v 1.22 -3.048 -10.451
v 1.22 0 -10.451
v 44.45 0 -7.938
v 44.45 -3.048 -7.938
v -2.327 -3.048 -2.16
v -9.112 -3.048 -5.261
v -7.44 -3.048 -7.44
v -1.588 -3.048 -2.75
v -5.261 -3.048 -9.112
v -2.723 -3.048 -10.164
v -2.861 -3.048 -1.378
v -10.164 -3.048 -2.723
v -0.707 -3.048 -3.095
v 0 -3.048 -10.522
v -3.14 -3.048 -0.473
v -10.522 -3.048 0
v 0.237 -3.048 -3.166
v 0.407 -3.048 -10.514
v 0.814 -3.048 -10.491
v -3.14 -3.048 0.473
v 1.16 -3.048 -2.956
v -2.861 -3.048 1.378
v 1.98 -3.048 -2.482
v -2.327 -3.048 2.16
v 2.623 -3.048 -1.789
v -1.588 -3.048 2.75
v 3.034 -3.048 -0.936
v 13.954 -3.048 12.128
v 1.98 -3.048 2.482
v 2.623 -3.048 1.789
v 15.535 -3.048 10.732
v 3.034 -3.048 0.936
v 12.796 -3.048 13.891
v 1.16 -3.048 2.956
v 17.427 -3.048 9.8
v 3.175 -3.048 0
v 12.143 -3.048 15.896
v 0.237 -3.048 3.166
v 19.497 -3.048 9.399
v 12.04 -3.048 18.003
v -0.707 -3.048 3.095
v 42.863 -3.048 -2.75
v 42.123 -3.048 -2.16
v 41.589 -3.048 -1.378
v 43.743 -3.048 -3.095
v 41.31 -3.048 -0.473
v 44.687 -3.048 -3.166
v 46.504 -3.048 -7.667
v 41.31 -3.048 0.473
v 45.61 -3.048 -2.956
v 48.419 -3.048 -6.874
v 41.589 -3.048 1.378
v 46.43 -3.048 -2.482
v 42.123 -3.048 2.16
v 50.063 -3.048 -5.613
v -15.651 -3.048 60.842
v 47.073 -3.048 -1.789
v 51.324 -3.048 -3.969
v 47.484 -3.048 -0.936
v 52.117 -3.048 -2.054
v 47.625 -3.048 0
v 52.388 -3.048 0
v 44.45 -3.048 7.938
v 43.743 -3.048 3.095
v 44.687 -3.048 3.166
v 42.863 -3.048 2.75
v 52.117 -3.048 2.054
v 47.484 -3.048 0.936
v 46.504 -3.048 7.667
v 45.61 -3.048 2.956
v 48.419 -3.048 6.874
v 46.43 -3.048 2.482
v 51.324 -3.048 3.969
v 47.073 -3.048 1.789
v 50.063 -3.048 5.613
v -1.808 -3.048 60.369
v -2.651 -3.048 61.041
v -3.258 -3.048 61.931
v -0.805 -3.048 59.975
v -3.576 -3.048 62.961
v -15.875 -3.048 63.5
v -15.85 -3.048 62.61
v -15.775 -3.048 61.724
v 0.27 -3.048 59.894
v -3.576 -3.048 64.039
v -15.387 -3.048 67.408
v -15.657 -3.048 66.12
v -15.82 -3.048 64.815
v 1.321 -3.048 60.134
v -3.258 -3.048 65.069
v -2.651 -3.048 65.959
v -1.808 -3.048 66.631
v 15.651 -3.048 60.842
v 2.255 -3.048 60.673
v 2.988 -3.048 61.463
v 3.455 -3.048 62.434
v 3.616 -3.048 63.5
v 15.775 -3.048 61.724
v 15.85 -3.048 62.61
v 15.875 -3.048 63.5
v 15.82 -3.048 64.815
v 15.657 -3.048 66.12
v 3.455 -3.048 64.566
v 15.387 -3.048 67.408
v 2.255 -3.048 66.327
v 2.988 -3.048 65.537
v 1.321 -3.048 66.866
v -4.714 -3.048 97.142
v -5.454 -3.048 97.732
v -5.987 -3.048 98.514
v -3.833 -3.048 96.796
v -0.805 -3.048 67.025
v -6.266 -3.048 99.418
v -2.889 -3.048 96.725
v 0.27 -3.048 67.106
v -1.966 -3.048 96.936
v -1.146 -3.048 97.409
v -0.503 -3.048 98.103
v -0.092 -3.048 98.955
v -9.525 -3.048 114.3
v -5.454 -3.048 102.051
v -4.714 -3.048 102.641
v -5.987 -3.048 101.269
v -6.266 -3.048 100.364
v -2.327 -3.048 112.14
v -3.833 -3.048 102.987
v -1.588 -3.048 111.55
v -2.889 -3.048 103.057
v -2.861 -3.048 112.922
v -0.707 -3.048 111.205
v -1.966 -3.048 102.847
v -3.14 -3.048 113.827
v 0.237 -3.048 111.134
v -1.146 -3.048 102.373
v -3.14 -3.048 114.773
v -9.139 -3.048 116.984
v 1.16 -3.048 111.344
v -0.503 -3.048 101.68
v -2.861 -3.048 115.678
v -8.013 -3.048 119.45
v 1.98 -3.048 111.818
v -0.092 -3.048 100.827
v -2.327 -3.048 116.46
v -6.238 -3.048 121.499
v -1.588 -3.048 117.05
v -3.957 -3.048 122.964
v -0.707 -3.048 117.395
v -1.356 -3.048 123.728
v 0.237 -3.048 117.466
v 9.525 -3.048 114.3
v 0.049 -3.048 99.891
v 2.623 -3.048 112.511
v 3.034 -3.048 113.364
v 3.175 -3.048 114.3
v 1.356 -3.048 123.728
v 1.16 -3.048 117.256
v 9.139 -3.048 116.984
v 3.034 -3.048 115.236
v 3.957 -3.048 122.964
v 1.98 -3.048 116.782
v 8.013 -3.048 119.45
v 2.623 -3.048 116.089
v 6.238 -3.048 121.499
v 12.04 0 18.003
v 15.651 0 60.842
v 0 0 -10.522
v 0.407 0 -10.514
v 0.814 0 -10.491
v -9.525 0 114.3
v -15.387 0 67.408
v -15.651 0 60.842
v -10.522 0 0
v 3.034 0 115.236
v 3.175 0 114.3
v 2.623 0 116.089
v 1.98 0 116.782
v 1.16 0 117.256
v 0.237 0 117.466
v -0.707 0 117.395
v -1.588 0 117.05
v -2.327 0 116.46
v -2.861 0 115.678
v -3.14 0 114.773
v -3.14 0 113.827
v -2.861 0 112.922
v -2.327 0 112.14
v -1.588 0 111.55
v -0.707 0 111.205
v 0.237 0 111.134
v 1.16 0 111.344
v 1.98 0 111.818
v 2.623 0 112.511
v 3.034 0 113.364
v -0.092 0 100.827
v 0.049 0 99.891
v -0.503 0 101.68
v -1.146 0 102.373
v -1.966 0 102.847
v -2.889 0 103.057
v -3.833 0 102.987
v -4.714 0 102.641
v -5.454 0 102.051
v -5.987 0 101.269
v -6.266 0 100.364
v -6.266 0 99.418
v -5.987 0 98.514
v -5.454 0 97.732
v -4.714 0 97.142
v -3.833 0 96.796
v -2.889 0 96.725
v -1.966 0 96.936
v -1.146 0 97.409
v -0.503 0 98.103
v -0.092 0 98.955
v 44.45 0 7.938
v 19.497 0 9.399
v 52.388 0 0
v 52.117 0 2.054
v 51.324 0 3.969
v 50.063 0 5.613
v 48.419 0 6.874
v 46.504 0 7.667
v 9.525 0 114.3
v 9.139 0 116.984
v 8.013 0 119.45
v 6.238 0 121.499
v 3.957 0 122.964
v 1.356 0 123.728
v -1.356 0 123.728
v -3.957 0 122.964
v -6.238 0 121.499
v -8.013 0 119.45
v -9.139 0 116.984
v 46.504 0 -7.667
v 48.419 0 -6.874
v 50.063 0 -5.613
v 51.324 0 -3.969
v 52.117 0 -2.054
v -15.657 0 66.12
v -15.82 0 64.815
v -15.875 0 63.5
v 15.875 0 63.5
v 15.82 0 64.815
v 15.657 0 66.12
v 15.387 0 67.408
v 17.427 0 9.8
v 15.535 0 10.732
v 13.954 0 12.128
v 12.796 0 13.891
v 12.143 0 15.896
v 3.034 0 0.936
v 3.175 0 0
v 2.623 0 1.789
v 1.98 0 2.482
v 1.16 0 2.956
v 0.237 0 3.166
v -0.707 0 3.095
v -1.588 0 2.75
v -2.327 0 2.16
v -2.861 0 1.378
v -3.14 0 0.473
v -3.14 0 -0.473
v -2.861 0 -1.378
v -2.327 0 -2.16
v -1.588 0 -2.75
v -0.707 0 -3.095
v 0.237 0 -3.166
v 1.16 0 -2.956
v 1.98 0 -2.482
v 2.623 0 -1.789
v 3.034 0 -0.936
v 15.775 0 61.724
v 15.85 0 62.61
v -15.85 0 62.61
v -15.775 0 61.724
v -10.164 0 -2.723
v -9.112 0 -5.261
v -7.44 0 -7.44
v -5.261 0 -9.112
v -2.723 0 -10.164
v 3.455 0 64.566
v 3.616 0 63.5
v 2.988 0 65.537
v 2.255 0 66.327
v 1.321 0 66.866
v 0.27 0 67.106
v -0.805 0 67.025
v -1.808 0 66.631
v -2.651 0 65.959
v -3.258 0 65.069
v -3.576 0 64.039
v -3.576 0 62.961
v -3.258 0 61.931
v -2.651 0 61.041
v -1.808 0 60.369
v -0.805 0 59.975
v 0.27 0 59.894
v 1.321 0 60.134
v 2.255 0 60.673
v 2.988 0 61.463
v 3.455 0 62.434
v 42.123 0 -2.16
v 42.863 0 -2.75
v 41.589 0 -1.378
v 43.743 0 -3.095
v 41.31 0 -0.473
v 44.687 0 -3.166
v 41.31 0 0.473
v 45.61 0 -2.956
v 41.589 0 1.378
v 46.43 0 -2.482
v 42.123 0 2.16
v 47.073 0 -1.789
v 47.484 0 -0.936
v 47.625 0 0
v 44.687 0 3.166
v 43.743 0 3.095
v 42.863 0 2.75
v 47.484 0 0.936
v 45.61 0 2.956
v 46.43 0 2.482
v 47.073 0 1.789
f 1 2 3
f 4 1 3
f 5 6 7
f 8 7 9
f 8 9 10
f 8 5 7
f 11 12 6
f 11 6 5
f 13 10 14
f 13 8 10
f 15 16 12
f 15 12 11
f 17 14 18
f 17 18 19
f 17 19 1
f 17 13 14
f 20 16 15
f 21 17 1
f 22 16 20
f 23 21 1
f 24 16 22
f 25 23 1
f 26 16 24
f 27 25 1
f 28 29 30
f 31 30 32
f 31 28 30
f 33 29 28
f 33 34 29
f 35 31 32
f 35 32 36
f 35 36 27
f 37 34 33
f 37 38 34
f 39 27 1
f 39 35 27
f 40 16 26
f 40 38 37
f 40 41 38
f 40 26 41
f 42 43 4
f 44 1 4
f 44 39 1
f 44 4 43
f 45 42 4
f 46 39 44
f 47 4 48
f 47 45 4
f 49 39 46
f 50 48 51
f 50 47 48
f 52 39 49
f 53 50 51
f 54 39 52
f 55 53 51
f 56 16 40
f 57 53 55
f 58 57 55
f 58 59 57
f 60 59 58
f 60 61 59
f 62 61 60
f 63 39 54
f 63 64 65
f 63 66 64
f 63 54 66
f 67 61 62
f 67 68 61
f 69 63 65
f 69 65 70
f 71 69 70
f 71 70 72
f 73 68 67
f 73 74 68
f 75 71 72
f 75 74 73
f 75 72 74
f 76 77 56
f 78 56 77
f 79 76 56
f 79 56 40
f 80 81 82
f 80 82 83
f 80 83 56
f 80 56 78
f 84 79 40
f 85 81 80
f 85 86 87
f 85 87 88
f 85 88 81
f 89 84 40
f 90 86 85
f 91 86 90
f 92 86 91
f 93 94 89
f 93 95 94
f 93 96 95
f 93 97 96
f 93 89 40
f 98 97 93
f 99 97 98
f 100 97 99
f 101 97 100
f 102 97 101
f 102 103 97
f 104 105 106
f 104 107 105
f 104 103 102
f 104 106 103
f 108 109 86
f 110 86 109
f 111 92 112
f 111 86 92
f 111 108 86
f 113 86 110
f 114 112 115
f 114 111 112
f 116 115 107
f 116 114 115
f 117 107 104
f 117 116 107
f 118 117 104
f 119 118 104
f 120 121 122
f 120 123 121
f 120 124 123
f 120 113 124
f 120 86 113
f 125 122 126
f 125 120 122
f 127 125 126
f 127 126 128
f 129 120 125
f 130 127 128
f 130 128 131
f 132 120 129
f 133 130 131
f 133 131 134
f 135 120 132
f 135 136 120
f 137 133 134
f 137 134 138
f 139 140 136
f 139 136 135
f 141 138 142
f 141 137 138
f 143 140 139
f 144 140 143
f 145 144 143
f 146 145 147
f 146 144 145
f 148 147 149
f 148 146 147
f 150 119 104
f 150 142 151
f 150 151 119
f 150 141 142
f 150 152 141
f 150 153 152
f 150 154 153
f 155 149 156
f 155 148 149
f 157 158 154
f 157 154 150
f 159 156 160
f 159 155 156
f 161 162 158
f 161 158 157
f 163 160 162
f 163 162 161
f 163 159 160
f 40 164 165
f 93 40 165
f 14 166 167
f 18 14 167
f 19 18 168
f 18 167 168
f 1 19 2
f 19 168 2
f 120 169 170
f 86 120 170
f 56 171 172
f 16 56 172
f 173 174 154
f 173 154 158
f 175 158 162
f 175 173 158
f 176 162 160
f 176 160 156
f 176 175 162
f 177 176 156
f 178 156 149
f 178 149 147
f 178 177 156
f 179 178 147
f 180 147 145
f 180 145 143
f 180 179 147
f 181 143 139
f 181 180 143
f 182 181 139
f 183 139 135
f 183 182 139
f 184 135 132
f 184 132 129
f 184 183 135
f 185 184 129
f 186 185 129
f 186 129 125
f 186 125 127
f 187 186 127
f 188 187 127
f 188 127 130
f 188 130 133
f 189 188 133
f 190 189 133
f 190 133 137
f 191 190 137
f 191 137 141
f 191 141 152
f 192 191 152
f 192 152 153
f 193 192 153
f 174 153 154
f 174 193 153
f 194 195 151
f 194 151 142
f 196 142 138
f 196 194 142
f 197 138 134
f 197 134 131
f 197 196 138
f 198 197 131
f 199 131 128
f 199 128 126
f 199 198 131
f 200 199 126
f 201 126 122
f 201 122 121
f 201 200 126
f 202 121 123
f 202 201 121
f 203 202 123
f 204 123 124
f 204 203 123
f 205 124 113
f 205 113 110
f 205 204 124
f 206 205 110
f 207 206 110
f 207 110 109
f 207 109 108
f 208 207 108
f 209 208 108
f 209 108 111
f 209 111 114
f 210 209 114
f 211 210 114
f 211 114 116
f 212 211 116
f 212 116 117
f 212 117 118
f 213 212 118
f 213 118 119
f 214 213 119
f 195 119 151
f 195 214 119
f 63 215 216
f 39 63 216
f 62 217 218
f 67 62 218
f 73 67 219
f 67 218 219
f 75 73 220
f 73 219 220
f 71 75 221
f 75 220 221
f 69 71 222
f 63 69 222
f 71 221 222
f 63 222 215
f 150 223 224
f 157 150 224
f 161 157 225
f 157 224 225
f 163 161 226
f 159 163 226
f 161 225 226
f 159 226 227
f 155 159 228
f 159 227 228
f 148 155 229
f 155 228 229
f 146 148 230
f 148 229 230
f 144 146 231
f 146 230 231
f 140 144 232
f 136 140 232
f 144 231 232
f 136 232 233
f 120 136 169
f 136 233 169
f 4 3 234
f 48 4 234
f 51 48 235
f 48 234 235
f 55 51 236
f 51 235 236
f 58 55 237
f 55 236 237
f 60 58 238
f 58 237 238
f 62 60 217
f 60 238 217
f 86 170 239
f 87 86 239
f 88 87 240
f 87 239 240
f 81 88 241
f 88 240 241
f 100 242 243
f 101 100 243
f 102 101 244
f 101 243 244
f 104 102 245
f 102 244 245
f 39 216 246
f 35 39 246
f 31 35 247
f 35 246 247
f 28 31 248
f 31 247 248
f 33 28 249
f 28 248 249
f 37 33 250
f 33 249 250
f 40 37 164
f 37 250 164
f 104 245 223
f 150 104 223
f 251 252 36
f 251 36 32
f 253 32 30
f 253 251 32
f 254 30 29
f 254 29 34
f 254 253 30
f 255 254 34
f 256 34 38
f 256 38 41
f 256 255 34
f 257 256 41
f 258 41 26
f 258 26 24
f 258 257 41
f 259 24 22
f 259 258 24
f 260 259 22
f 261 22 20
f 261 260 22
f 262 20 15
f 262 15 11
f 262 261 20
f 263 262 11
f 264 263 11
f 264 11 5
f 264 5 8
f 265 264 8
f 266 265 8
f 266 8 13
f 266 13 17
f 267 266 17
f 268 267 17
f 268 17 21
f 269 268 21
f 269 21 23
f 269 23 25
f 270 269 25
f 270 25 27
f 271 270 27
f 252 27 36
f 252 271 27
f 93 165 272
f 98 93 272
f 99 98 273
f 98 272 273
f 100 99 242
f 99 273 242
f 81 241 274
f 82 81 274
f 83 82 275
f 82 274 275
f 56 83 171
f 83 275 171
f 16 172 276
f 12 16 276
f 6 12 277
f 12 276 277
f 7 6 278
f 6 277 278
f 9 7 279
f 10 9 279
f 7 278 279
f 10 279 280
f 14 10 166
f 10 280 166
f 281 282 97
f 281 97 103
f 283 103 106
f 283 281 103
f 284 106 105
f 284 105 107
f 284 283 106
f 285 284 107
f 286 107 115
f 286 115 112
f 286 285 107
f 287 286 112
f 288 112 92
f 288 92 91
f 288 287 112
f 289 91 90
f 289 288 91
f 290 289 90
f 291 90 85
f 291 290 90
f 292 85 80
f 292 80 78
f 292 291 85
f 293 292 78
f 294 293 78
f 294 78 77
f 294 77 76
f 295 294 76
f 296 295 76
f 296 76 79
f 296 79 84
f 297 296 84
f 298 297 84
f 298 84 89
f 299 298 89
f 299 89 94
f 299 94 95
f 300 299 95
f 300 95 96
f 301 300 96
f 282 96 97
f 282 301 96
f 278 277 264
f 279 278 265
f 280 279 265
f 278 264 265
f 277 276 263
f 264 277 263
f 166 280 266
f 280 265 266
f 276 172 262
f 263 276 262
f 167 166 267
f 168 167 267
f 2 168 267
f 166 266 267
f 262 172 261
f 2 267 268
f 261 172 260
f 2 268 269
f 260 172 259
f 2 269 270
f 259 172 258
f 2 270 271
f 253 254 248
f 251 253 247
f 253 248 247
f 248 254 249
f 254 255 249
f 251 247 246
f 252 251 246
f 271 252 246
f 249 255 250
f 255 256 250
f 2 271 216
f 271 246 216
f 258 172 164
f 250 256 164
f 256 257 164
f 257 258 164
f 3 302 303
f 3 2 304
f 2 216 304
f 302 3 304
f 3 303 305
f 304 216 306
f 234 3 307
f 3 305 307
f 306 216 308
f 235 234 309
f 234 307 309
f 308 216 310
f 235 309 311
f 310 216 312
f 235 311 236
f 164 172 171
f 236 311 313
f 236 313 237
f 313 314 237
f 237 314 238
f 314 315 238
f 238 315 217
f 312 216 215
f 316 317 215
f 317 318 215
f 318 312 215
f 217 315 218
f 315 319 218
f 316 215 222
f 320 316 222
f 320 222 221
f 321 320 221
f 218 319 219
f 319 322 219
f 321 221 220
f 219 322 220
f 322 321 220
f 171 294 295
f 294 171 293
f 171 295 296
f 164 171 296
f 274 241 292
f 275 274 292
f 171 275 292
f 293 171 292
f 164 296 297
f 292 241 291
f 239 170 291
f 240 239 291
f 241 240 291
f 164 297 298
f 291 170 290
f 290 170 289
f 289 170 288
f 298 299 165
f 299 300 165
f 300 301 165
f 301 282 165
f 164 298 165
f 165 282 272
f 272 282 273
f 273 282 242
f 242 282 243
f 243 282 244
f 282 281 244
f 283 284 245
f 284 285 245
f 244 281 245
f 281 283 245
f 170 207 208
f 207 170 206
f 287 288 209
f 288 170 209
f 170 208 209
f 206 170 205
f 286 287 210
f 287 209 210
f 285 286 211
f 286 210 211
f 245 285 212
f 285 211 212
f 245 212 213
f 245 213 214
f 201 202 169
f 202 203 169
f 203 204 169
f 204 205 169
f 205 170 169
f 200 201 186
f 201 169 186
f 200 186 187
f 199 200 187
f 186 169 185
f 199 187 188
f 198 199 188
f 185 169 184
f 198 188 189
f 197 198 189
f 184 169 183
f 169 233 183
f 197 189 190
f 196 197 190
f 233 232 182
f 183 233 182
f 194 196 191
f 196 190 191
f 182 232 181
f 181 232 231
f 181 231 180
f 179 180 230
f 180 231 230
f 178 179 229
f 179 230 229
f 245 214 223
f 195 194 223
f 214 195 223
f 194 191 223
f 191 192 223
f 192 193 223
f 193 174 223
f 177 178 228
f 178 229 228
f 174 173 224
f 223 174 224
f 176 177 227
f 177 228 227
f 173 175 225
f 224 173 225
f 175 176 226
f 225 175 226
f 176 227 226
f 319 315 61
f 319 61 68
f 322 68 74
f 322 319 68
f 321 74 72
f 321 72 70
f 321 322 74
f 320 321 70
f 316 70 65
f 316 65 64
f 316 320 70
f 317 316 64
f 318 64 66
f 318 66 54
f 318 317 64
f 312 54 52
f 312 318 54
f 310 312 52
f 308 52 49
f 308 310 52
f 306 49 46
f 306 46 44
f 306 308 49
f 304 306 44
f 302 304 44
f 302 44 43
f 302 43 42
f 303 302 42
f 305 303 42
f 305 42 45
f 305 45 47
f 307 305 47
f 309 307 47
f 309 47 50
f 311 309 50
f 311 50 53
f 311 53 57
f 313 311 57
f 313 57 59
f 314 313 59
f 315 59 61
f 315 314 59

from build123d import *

# Parameters (mm, degrees)
F0_R     = 3.175
F0_R_2   = 3.6159437641
F1_DEPTH = 3.048


with BuildPart() as f1:
    # F0 (on Front) → F1 (new body)
    with BuildSketch(Plane.XZ):
        with BuildLine():
            ThreePointArc((-9.525, 114.3), (0, 104.775), (9.525, 114.3))
            ThreePointArc((9.525, 114.3), (0, 123.825), (-9.525, 114.3))
        make_face()
        with Locations((0, 114.3)):
            Circle(F0_R, mode=Mode.SUBTRACT)
        with BuildLine():
            Line((15.3865384615, 67.4076923077), (9.525, 114.3))
            ThreePointArc((9.525, 114.3), (0, 104.775), (-9.525, 114.3))
            Line((-9.525, 114.3), (-15.3865384615, 67.4076923077))
            ThreePointArc((-15.3865384615, 67.4076923077), (0, 79.375), (15.3865384615, 67.4076923077))
        make_face()
        with Locations((-3.1260617511, 99.8911798788)):
            Circle(F0_R, mode=Mode.SUBTRACT)
        with BuildLine():
            Line((15.875, 63.5), (15.3865384615, 67.4076923077))
            ThreePointArc((15.3865384615, 67.4076923077), (0, 79.375), (-15.3865384615, 67.4076923077))
            Line((-15.3865384615, 67.4076923077), (-15.875, 63.5))
            Line((-15.875, 63.5), (-15.6509715667, 60.8424232807))
            ThreePointArc((-15.6509715667, 60.8424232807), (0, 47.625), (15.6509715667, 60.8424232807))
            Line((15.6509715667, 60.8424232807), (15.875, 63.5))
        make_face()
        with Locations((0, 63.5)):
            Circle(F0_R_2, mode=Mode.SUBTRACT)
        with BuildLine():
            ThreePointArc((15.875, 63.5), (15.7524112928, 65.4690514116), (15.3865384615, 67.4076923077))
            Line((15.3865384615, 67.4076923077), (15.875, 63.5))
        make_face()
        with BuildLine():
            Line((-15.875, 63.5), (-15.3865384615, 67.4076923077))
            ThreePointArc((-15.3865384615, 67.4076923077), (-15.7524112928, 65.4690514116), (-15.875, 63.5))
        make_face()
        with BuildLine():
            ThreePointArc((15.6509715667, 60.8424232807), (15.8188937448, 62.1664987103), (15.875, 63.5))
            Line((15.875, 63.5), (15.6509715667, 60.8424232807))
        make_face()
        with BuildLine():
            Line((-15.6509715667, 60.8424232807), (-15.875, 63.5))
            ThreePointArc((-15.875, 63.5), (-15.8188937448, 62.1664987103), (-15.6509715667, 60.8424232807))
        make_face()
        with BuildLine():
            Line((12.0396887444, 18.0029452157), (15.6509715667, 60.8424232807))
            ThreePointArc((15.6509715667, 60.8424232807), (0, 47.625), (-15.6509715667, 60.8424232807))
            Line((-15.6509715667, 60.8424232807), (-10.5220762583, 0))
            ThreePointArc((-10.5220762583, 0), (0, 10.5220762583), (10.5220762583, 0))
            ThreePointArc((10.5220762583, 0), (7.8595738312, -6.99579788), (1.2195038808, -10.4511673545))
            Line((1.2195038808, -10.4511673545), (44.45, -7.9375))
            ThreePointArc((44.45, -7.9375), (36.5125, 0), (44.45, 7.9375))
            Line((44.45, 7.9375), (19.4970935517, 9.3985203982))
            ThreePointArc((19.4970935517, 9.3985203982), (13.9539931587, 12.1282046514), (12.0396887444, 18.0029452157))
        make_face()
        with BuildLine():
            ThreePointArc((10.5220762583, 0), (0, 10.5220762583), (-10.5220762583, 0))
            ThreePointArc((-10.5220762583, 0), (-7.4402314744, -7.4402314744), (0, -10.5220762583))
            Line((0, -10.5220762583), (1.2195038808, -10.4511673545))
            ThreePointArc((1.2195038808, -10.4511673545), (7.8595738312, -6.99579788), (10.5220762583, 0))
        make_face()
        Circle(F0_R, mode=Mode.SUBTRACT)
        with BuildLine():
            Line((1.2195038808, -10.4511673545), (0, -10.5220762583))
            ThreePointArc((0, -10.5220762583), (0.6107818326, -10.504334074), (1.2195038808, -10.4511673545))
        make_face()
        with BuildLine():
            ThreePointArc((52.3875, 0), (50.0626600757, 5.6126600757), (44.45, 7.9375))
            ThreePointArc((44.45, 7.9375), (36.5125, 0), (44.45, -7.9375))
            ThreePointArc((44.45, -7.9375), (50.0626600757, -5.6126600757), (52.3875, 0))
        make_face()
        with Locations((44.45, 0)):
            Circle(F0_R, mode=Mode.SUBTRACT)
    extrude(amount=F1_DEPTH)


solid = f1.part
